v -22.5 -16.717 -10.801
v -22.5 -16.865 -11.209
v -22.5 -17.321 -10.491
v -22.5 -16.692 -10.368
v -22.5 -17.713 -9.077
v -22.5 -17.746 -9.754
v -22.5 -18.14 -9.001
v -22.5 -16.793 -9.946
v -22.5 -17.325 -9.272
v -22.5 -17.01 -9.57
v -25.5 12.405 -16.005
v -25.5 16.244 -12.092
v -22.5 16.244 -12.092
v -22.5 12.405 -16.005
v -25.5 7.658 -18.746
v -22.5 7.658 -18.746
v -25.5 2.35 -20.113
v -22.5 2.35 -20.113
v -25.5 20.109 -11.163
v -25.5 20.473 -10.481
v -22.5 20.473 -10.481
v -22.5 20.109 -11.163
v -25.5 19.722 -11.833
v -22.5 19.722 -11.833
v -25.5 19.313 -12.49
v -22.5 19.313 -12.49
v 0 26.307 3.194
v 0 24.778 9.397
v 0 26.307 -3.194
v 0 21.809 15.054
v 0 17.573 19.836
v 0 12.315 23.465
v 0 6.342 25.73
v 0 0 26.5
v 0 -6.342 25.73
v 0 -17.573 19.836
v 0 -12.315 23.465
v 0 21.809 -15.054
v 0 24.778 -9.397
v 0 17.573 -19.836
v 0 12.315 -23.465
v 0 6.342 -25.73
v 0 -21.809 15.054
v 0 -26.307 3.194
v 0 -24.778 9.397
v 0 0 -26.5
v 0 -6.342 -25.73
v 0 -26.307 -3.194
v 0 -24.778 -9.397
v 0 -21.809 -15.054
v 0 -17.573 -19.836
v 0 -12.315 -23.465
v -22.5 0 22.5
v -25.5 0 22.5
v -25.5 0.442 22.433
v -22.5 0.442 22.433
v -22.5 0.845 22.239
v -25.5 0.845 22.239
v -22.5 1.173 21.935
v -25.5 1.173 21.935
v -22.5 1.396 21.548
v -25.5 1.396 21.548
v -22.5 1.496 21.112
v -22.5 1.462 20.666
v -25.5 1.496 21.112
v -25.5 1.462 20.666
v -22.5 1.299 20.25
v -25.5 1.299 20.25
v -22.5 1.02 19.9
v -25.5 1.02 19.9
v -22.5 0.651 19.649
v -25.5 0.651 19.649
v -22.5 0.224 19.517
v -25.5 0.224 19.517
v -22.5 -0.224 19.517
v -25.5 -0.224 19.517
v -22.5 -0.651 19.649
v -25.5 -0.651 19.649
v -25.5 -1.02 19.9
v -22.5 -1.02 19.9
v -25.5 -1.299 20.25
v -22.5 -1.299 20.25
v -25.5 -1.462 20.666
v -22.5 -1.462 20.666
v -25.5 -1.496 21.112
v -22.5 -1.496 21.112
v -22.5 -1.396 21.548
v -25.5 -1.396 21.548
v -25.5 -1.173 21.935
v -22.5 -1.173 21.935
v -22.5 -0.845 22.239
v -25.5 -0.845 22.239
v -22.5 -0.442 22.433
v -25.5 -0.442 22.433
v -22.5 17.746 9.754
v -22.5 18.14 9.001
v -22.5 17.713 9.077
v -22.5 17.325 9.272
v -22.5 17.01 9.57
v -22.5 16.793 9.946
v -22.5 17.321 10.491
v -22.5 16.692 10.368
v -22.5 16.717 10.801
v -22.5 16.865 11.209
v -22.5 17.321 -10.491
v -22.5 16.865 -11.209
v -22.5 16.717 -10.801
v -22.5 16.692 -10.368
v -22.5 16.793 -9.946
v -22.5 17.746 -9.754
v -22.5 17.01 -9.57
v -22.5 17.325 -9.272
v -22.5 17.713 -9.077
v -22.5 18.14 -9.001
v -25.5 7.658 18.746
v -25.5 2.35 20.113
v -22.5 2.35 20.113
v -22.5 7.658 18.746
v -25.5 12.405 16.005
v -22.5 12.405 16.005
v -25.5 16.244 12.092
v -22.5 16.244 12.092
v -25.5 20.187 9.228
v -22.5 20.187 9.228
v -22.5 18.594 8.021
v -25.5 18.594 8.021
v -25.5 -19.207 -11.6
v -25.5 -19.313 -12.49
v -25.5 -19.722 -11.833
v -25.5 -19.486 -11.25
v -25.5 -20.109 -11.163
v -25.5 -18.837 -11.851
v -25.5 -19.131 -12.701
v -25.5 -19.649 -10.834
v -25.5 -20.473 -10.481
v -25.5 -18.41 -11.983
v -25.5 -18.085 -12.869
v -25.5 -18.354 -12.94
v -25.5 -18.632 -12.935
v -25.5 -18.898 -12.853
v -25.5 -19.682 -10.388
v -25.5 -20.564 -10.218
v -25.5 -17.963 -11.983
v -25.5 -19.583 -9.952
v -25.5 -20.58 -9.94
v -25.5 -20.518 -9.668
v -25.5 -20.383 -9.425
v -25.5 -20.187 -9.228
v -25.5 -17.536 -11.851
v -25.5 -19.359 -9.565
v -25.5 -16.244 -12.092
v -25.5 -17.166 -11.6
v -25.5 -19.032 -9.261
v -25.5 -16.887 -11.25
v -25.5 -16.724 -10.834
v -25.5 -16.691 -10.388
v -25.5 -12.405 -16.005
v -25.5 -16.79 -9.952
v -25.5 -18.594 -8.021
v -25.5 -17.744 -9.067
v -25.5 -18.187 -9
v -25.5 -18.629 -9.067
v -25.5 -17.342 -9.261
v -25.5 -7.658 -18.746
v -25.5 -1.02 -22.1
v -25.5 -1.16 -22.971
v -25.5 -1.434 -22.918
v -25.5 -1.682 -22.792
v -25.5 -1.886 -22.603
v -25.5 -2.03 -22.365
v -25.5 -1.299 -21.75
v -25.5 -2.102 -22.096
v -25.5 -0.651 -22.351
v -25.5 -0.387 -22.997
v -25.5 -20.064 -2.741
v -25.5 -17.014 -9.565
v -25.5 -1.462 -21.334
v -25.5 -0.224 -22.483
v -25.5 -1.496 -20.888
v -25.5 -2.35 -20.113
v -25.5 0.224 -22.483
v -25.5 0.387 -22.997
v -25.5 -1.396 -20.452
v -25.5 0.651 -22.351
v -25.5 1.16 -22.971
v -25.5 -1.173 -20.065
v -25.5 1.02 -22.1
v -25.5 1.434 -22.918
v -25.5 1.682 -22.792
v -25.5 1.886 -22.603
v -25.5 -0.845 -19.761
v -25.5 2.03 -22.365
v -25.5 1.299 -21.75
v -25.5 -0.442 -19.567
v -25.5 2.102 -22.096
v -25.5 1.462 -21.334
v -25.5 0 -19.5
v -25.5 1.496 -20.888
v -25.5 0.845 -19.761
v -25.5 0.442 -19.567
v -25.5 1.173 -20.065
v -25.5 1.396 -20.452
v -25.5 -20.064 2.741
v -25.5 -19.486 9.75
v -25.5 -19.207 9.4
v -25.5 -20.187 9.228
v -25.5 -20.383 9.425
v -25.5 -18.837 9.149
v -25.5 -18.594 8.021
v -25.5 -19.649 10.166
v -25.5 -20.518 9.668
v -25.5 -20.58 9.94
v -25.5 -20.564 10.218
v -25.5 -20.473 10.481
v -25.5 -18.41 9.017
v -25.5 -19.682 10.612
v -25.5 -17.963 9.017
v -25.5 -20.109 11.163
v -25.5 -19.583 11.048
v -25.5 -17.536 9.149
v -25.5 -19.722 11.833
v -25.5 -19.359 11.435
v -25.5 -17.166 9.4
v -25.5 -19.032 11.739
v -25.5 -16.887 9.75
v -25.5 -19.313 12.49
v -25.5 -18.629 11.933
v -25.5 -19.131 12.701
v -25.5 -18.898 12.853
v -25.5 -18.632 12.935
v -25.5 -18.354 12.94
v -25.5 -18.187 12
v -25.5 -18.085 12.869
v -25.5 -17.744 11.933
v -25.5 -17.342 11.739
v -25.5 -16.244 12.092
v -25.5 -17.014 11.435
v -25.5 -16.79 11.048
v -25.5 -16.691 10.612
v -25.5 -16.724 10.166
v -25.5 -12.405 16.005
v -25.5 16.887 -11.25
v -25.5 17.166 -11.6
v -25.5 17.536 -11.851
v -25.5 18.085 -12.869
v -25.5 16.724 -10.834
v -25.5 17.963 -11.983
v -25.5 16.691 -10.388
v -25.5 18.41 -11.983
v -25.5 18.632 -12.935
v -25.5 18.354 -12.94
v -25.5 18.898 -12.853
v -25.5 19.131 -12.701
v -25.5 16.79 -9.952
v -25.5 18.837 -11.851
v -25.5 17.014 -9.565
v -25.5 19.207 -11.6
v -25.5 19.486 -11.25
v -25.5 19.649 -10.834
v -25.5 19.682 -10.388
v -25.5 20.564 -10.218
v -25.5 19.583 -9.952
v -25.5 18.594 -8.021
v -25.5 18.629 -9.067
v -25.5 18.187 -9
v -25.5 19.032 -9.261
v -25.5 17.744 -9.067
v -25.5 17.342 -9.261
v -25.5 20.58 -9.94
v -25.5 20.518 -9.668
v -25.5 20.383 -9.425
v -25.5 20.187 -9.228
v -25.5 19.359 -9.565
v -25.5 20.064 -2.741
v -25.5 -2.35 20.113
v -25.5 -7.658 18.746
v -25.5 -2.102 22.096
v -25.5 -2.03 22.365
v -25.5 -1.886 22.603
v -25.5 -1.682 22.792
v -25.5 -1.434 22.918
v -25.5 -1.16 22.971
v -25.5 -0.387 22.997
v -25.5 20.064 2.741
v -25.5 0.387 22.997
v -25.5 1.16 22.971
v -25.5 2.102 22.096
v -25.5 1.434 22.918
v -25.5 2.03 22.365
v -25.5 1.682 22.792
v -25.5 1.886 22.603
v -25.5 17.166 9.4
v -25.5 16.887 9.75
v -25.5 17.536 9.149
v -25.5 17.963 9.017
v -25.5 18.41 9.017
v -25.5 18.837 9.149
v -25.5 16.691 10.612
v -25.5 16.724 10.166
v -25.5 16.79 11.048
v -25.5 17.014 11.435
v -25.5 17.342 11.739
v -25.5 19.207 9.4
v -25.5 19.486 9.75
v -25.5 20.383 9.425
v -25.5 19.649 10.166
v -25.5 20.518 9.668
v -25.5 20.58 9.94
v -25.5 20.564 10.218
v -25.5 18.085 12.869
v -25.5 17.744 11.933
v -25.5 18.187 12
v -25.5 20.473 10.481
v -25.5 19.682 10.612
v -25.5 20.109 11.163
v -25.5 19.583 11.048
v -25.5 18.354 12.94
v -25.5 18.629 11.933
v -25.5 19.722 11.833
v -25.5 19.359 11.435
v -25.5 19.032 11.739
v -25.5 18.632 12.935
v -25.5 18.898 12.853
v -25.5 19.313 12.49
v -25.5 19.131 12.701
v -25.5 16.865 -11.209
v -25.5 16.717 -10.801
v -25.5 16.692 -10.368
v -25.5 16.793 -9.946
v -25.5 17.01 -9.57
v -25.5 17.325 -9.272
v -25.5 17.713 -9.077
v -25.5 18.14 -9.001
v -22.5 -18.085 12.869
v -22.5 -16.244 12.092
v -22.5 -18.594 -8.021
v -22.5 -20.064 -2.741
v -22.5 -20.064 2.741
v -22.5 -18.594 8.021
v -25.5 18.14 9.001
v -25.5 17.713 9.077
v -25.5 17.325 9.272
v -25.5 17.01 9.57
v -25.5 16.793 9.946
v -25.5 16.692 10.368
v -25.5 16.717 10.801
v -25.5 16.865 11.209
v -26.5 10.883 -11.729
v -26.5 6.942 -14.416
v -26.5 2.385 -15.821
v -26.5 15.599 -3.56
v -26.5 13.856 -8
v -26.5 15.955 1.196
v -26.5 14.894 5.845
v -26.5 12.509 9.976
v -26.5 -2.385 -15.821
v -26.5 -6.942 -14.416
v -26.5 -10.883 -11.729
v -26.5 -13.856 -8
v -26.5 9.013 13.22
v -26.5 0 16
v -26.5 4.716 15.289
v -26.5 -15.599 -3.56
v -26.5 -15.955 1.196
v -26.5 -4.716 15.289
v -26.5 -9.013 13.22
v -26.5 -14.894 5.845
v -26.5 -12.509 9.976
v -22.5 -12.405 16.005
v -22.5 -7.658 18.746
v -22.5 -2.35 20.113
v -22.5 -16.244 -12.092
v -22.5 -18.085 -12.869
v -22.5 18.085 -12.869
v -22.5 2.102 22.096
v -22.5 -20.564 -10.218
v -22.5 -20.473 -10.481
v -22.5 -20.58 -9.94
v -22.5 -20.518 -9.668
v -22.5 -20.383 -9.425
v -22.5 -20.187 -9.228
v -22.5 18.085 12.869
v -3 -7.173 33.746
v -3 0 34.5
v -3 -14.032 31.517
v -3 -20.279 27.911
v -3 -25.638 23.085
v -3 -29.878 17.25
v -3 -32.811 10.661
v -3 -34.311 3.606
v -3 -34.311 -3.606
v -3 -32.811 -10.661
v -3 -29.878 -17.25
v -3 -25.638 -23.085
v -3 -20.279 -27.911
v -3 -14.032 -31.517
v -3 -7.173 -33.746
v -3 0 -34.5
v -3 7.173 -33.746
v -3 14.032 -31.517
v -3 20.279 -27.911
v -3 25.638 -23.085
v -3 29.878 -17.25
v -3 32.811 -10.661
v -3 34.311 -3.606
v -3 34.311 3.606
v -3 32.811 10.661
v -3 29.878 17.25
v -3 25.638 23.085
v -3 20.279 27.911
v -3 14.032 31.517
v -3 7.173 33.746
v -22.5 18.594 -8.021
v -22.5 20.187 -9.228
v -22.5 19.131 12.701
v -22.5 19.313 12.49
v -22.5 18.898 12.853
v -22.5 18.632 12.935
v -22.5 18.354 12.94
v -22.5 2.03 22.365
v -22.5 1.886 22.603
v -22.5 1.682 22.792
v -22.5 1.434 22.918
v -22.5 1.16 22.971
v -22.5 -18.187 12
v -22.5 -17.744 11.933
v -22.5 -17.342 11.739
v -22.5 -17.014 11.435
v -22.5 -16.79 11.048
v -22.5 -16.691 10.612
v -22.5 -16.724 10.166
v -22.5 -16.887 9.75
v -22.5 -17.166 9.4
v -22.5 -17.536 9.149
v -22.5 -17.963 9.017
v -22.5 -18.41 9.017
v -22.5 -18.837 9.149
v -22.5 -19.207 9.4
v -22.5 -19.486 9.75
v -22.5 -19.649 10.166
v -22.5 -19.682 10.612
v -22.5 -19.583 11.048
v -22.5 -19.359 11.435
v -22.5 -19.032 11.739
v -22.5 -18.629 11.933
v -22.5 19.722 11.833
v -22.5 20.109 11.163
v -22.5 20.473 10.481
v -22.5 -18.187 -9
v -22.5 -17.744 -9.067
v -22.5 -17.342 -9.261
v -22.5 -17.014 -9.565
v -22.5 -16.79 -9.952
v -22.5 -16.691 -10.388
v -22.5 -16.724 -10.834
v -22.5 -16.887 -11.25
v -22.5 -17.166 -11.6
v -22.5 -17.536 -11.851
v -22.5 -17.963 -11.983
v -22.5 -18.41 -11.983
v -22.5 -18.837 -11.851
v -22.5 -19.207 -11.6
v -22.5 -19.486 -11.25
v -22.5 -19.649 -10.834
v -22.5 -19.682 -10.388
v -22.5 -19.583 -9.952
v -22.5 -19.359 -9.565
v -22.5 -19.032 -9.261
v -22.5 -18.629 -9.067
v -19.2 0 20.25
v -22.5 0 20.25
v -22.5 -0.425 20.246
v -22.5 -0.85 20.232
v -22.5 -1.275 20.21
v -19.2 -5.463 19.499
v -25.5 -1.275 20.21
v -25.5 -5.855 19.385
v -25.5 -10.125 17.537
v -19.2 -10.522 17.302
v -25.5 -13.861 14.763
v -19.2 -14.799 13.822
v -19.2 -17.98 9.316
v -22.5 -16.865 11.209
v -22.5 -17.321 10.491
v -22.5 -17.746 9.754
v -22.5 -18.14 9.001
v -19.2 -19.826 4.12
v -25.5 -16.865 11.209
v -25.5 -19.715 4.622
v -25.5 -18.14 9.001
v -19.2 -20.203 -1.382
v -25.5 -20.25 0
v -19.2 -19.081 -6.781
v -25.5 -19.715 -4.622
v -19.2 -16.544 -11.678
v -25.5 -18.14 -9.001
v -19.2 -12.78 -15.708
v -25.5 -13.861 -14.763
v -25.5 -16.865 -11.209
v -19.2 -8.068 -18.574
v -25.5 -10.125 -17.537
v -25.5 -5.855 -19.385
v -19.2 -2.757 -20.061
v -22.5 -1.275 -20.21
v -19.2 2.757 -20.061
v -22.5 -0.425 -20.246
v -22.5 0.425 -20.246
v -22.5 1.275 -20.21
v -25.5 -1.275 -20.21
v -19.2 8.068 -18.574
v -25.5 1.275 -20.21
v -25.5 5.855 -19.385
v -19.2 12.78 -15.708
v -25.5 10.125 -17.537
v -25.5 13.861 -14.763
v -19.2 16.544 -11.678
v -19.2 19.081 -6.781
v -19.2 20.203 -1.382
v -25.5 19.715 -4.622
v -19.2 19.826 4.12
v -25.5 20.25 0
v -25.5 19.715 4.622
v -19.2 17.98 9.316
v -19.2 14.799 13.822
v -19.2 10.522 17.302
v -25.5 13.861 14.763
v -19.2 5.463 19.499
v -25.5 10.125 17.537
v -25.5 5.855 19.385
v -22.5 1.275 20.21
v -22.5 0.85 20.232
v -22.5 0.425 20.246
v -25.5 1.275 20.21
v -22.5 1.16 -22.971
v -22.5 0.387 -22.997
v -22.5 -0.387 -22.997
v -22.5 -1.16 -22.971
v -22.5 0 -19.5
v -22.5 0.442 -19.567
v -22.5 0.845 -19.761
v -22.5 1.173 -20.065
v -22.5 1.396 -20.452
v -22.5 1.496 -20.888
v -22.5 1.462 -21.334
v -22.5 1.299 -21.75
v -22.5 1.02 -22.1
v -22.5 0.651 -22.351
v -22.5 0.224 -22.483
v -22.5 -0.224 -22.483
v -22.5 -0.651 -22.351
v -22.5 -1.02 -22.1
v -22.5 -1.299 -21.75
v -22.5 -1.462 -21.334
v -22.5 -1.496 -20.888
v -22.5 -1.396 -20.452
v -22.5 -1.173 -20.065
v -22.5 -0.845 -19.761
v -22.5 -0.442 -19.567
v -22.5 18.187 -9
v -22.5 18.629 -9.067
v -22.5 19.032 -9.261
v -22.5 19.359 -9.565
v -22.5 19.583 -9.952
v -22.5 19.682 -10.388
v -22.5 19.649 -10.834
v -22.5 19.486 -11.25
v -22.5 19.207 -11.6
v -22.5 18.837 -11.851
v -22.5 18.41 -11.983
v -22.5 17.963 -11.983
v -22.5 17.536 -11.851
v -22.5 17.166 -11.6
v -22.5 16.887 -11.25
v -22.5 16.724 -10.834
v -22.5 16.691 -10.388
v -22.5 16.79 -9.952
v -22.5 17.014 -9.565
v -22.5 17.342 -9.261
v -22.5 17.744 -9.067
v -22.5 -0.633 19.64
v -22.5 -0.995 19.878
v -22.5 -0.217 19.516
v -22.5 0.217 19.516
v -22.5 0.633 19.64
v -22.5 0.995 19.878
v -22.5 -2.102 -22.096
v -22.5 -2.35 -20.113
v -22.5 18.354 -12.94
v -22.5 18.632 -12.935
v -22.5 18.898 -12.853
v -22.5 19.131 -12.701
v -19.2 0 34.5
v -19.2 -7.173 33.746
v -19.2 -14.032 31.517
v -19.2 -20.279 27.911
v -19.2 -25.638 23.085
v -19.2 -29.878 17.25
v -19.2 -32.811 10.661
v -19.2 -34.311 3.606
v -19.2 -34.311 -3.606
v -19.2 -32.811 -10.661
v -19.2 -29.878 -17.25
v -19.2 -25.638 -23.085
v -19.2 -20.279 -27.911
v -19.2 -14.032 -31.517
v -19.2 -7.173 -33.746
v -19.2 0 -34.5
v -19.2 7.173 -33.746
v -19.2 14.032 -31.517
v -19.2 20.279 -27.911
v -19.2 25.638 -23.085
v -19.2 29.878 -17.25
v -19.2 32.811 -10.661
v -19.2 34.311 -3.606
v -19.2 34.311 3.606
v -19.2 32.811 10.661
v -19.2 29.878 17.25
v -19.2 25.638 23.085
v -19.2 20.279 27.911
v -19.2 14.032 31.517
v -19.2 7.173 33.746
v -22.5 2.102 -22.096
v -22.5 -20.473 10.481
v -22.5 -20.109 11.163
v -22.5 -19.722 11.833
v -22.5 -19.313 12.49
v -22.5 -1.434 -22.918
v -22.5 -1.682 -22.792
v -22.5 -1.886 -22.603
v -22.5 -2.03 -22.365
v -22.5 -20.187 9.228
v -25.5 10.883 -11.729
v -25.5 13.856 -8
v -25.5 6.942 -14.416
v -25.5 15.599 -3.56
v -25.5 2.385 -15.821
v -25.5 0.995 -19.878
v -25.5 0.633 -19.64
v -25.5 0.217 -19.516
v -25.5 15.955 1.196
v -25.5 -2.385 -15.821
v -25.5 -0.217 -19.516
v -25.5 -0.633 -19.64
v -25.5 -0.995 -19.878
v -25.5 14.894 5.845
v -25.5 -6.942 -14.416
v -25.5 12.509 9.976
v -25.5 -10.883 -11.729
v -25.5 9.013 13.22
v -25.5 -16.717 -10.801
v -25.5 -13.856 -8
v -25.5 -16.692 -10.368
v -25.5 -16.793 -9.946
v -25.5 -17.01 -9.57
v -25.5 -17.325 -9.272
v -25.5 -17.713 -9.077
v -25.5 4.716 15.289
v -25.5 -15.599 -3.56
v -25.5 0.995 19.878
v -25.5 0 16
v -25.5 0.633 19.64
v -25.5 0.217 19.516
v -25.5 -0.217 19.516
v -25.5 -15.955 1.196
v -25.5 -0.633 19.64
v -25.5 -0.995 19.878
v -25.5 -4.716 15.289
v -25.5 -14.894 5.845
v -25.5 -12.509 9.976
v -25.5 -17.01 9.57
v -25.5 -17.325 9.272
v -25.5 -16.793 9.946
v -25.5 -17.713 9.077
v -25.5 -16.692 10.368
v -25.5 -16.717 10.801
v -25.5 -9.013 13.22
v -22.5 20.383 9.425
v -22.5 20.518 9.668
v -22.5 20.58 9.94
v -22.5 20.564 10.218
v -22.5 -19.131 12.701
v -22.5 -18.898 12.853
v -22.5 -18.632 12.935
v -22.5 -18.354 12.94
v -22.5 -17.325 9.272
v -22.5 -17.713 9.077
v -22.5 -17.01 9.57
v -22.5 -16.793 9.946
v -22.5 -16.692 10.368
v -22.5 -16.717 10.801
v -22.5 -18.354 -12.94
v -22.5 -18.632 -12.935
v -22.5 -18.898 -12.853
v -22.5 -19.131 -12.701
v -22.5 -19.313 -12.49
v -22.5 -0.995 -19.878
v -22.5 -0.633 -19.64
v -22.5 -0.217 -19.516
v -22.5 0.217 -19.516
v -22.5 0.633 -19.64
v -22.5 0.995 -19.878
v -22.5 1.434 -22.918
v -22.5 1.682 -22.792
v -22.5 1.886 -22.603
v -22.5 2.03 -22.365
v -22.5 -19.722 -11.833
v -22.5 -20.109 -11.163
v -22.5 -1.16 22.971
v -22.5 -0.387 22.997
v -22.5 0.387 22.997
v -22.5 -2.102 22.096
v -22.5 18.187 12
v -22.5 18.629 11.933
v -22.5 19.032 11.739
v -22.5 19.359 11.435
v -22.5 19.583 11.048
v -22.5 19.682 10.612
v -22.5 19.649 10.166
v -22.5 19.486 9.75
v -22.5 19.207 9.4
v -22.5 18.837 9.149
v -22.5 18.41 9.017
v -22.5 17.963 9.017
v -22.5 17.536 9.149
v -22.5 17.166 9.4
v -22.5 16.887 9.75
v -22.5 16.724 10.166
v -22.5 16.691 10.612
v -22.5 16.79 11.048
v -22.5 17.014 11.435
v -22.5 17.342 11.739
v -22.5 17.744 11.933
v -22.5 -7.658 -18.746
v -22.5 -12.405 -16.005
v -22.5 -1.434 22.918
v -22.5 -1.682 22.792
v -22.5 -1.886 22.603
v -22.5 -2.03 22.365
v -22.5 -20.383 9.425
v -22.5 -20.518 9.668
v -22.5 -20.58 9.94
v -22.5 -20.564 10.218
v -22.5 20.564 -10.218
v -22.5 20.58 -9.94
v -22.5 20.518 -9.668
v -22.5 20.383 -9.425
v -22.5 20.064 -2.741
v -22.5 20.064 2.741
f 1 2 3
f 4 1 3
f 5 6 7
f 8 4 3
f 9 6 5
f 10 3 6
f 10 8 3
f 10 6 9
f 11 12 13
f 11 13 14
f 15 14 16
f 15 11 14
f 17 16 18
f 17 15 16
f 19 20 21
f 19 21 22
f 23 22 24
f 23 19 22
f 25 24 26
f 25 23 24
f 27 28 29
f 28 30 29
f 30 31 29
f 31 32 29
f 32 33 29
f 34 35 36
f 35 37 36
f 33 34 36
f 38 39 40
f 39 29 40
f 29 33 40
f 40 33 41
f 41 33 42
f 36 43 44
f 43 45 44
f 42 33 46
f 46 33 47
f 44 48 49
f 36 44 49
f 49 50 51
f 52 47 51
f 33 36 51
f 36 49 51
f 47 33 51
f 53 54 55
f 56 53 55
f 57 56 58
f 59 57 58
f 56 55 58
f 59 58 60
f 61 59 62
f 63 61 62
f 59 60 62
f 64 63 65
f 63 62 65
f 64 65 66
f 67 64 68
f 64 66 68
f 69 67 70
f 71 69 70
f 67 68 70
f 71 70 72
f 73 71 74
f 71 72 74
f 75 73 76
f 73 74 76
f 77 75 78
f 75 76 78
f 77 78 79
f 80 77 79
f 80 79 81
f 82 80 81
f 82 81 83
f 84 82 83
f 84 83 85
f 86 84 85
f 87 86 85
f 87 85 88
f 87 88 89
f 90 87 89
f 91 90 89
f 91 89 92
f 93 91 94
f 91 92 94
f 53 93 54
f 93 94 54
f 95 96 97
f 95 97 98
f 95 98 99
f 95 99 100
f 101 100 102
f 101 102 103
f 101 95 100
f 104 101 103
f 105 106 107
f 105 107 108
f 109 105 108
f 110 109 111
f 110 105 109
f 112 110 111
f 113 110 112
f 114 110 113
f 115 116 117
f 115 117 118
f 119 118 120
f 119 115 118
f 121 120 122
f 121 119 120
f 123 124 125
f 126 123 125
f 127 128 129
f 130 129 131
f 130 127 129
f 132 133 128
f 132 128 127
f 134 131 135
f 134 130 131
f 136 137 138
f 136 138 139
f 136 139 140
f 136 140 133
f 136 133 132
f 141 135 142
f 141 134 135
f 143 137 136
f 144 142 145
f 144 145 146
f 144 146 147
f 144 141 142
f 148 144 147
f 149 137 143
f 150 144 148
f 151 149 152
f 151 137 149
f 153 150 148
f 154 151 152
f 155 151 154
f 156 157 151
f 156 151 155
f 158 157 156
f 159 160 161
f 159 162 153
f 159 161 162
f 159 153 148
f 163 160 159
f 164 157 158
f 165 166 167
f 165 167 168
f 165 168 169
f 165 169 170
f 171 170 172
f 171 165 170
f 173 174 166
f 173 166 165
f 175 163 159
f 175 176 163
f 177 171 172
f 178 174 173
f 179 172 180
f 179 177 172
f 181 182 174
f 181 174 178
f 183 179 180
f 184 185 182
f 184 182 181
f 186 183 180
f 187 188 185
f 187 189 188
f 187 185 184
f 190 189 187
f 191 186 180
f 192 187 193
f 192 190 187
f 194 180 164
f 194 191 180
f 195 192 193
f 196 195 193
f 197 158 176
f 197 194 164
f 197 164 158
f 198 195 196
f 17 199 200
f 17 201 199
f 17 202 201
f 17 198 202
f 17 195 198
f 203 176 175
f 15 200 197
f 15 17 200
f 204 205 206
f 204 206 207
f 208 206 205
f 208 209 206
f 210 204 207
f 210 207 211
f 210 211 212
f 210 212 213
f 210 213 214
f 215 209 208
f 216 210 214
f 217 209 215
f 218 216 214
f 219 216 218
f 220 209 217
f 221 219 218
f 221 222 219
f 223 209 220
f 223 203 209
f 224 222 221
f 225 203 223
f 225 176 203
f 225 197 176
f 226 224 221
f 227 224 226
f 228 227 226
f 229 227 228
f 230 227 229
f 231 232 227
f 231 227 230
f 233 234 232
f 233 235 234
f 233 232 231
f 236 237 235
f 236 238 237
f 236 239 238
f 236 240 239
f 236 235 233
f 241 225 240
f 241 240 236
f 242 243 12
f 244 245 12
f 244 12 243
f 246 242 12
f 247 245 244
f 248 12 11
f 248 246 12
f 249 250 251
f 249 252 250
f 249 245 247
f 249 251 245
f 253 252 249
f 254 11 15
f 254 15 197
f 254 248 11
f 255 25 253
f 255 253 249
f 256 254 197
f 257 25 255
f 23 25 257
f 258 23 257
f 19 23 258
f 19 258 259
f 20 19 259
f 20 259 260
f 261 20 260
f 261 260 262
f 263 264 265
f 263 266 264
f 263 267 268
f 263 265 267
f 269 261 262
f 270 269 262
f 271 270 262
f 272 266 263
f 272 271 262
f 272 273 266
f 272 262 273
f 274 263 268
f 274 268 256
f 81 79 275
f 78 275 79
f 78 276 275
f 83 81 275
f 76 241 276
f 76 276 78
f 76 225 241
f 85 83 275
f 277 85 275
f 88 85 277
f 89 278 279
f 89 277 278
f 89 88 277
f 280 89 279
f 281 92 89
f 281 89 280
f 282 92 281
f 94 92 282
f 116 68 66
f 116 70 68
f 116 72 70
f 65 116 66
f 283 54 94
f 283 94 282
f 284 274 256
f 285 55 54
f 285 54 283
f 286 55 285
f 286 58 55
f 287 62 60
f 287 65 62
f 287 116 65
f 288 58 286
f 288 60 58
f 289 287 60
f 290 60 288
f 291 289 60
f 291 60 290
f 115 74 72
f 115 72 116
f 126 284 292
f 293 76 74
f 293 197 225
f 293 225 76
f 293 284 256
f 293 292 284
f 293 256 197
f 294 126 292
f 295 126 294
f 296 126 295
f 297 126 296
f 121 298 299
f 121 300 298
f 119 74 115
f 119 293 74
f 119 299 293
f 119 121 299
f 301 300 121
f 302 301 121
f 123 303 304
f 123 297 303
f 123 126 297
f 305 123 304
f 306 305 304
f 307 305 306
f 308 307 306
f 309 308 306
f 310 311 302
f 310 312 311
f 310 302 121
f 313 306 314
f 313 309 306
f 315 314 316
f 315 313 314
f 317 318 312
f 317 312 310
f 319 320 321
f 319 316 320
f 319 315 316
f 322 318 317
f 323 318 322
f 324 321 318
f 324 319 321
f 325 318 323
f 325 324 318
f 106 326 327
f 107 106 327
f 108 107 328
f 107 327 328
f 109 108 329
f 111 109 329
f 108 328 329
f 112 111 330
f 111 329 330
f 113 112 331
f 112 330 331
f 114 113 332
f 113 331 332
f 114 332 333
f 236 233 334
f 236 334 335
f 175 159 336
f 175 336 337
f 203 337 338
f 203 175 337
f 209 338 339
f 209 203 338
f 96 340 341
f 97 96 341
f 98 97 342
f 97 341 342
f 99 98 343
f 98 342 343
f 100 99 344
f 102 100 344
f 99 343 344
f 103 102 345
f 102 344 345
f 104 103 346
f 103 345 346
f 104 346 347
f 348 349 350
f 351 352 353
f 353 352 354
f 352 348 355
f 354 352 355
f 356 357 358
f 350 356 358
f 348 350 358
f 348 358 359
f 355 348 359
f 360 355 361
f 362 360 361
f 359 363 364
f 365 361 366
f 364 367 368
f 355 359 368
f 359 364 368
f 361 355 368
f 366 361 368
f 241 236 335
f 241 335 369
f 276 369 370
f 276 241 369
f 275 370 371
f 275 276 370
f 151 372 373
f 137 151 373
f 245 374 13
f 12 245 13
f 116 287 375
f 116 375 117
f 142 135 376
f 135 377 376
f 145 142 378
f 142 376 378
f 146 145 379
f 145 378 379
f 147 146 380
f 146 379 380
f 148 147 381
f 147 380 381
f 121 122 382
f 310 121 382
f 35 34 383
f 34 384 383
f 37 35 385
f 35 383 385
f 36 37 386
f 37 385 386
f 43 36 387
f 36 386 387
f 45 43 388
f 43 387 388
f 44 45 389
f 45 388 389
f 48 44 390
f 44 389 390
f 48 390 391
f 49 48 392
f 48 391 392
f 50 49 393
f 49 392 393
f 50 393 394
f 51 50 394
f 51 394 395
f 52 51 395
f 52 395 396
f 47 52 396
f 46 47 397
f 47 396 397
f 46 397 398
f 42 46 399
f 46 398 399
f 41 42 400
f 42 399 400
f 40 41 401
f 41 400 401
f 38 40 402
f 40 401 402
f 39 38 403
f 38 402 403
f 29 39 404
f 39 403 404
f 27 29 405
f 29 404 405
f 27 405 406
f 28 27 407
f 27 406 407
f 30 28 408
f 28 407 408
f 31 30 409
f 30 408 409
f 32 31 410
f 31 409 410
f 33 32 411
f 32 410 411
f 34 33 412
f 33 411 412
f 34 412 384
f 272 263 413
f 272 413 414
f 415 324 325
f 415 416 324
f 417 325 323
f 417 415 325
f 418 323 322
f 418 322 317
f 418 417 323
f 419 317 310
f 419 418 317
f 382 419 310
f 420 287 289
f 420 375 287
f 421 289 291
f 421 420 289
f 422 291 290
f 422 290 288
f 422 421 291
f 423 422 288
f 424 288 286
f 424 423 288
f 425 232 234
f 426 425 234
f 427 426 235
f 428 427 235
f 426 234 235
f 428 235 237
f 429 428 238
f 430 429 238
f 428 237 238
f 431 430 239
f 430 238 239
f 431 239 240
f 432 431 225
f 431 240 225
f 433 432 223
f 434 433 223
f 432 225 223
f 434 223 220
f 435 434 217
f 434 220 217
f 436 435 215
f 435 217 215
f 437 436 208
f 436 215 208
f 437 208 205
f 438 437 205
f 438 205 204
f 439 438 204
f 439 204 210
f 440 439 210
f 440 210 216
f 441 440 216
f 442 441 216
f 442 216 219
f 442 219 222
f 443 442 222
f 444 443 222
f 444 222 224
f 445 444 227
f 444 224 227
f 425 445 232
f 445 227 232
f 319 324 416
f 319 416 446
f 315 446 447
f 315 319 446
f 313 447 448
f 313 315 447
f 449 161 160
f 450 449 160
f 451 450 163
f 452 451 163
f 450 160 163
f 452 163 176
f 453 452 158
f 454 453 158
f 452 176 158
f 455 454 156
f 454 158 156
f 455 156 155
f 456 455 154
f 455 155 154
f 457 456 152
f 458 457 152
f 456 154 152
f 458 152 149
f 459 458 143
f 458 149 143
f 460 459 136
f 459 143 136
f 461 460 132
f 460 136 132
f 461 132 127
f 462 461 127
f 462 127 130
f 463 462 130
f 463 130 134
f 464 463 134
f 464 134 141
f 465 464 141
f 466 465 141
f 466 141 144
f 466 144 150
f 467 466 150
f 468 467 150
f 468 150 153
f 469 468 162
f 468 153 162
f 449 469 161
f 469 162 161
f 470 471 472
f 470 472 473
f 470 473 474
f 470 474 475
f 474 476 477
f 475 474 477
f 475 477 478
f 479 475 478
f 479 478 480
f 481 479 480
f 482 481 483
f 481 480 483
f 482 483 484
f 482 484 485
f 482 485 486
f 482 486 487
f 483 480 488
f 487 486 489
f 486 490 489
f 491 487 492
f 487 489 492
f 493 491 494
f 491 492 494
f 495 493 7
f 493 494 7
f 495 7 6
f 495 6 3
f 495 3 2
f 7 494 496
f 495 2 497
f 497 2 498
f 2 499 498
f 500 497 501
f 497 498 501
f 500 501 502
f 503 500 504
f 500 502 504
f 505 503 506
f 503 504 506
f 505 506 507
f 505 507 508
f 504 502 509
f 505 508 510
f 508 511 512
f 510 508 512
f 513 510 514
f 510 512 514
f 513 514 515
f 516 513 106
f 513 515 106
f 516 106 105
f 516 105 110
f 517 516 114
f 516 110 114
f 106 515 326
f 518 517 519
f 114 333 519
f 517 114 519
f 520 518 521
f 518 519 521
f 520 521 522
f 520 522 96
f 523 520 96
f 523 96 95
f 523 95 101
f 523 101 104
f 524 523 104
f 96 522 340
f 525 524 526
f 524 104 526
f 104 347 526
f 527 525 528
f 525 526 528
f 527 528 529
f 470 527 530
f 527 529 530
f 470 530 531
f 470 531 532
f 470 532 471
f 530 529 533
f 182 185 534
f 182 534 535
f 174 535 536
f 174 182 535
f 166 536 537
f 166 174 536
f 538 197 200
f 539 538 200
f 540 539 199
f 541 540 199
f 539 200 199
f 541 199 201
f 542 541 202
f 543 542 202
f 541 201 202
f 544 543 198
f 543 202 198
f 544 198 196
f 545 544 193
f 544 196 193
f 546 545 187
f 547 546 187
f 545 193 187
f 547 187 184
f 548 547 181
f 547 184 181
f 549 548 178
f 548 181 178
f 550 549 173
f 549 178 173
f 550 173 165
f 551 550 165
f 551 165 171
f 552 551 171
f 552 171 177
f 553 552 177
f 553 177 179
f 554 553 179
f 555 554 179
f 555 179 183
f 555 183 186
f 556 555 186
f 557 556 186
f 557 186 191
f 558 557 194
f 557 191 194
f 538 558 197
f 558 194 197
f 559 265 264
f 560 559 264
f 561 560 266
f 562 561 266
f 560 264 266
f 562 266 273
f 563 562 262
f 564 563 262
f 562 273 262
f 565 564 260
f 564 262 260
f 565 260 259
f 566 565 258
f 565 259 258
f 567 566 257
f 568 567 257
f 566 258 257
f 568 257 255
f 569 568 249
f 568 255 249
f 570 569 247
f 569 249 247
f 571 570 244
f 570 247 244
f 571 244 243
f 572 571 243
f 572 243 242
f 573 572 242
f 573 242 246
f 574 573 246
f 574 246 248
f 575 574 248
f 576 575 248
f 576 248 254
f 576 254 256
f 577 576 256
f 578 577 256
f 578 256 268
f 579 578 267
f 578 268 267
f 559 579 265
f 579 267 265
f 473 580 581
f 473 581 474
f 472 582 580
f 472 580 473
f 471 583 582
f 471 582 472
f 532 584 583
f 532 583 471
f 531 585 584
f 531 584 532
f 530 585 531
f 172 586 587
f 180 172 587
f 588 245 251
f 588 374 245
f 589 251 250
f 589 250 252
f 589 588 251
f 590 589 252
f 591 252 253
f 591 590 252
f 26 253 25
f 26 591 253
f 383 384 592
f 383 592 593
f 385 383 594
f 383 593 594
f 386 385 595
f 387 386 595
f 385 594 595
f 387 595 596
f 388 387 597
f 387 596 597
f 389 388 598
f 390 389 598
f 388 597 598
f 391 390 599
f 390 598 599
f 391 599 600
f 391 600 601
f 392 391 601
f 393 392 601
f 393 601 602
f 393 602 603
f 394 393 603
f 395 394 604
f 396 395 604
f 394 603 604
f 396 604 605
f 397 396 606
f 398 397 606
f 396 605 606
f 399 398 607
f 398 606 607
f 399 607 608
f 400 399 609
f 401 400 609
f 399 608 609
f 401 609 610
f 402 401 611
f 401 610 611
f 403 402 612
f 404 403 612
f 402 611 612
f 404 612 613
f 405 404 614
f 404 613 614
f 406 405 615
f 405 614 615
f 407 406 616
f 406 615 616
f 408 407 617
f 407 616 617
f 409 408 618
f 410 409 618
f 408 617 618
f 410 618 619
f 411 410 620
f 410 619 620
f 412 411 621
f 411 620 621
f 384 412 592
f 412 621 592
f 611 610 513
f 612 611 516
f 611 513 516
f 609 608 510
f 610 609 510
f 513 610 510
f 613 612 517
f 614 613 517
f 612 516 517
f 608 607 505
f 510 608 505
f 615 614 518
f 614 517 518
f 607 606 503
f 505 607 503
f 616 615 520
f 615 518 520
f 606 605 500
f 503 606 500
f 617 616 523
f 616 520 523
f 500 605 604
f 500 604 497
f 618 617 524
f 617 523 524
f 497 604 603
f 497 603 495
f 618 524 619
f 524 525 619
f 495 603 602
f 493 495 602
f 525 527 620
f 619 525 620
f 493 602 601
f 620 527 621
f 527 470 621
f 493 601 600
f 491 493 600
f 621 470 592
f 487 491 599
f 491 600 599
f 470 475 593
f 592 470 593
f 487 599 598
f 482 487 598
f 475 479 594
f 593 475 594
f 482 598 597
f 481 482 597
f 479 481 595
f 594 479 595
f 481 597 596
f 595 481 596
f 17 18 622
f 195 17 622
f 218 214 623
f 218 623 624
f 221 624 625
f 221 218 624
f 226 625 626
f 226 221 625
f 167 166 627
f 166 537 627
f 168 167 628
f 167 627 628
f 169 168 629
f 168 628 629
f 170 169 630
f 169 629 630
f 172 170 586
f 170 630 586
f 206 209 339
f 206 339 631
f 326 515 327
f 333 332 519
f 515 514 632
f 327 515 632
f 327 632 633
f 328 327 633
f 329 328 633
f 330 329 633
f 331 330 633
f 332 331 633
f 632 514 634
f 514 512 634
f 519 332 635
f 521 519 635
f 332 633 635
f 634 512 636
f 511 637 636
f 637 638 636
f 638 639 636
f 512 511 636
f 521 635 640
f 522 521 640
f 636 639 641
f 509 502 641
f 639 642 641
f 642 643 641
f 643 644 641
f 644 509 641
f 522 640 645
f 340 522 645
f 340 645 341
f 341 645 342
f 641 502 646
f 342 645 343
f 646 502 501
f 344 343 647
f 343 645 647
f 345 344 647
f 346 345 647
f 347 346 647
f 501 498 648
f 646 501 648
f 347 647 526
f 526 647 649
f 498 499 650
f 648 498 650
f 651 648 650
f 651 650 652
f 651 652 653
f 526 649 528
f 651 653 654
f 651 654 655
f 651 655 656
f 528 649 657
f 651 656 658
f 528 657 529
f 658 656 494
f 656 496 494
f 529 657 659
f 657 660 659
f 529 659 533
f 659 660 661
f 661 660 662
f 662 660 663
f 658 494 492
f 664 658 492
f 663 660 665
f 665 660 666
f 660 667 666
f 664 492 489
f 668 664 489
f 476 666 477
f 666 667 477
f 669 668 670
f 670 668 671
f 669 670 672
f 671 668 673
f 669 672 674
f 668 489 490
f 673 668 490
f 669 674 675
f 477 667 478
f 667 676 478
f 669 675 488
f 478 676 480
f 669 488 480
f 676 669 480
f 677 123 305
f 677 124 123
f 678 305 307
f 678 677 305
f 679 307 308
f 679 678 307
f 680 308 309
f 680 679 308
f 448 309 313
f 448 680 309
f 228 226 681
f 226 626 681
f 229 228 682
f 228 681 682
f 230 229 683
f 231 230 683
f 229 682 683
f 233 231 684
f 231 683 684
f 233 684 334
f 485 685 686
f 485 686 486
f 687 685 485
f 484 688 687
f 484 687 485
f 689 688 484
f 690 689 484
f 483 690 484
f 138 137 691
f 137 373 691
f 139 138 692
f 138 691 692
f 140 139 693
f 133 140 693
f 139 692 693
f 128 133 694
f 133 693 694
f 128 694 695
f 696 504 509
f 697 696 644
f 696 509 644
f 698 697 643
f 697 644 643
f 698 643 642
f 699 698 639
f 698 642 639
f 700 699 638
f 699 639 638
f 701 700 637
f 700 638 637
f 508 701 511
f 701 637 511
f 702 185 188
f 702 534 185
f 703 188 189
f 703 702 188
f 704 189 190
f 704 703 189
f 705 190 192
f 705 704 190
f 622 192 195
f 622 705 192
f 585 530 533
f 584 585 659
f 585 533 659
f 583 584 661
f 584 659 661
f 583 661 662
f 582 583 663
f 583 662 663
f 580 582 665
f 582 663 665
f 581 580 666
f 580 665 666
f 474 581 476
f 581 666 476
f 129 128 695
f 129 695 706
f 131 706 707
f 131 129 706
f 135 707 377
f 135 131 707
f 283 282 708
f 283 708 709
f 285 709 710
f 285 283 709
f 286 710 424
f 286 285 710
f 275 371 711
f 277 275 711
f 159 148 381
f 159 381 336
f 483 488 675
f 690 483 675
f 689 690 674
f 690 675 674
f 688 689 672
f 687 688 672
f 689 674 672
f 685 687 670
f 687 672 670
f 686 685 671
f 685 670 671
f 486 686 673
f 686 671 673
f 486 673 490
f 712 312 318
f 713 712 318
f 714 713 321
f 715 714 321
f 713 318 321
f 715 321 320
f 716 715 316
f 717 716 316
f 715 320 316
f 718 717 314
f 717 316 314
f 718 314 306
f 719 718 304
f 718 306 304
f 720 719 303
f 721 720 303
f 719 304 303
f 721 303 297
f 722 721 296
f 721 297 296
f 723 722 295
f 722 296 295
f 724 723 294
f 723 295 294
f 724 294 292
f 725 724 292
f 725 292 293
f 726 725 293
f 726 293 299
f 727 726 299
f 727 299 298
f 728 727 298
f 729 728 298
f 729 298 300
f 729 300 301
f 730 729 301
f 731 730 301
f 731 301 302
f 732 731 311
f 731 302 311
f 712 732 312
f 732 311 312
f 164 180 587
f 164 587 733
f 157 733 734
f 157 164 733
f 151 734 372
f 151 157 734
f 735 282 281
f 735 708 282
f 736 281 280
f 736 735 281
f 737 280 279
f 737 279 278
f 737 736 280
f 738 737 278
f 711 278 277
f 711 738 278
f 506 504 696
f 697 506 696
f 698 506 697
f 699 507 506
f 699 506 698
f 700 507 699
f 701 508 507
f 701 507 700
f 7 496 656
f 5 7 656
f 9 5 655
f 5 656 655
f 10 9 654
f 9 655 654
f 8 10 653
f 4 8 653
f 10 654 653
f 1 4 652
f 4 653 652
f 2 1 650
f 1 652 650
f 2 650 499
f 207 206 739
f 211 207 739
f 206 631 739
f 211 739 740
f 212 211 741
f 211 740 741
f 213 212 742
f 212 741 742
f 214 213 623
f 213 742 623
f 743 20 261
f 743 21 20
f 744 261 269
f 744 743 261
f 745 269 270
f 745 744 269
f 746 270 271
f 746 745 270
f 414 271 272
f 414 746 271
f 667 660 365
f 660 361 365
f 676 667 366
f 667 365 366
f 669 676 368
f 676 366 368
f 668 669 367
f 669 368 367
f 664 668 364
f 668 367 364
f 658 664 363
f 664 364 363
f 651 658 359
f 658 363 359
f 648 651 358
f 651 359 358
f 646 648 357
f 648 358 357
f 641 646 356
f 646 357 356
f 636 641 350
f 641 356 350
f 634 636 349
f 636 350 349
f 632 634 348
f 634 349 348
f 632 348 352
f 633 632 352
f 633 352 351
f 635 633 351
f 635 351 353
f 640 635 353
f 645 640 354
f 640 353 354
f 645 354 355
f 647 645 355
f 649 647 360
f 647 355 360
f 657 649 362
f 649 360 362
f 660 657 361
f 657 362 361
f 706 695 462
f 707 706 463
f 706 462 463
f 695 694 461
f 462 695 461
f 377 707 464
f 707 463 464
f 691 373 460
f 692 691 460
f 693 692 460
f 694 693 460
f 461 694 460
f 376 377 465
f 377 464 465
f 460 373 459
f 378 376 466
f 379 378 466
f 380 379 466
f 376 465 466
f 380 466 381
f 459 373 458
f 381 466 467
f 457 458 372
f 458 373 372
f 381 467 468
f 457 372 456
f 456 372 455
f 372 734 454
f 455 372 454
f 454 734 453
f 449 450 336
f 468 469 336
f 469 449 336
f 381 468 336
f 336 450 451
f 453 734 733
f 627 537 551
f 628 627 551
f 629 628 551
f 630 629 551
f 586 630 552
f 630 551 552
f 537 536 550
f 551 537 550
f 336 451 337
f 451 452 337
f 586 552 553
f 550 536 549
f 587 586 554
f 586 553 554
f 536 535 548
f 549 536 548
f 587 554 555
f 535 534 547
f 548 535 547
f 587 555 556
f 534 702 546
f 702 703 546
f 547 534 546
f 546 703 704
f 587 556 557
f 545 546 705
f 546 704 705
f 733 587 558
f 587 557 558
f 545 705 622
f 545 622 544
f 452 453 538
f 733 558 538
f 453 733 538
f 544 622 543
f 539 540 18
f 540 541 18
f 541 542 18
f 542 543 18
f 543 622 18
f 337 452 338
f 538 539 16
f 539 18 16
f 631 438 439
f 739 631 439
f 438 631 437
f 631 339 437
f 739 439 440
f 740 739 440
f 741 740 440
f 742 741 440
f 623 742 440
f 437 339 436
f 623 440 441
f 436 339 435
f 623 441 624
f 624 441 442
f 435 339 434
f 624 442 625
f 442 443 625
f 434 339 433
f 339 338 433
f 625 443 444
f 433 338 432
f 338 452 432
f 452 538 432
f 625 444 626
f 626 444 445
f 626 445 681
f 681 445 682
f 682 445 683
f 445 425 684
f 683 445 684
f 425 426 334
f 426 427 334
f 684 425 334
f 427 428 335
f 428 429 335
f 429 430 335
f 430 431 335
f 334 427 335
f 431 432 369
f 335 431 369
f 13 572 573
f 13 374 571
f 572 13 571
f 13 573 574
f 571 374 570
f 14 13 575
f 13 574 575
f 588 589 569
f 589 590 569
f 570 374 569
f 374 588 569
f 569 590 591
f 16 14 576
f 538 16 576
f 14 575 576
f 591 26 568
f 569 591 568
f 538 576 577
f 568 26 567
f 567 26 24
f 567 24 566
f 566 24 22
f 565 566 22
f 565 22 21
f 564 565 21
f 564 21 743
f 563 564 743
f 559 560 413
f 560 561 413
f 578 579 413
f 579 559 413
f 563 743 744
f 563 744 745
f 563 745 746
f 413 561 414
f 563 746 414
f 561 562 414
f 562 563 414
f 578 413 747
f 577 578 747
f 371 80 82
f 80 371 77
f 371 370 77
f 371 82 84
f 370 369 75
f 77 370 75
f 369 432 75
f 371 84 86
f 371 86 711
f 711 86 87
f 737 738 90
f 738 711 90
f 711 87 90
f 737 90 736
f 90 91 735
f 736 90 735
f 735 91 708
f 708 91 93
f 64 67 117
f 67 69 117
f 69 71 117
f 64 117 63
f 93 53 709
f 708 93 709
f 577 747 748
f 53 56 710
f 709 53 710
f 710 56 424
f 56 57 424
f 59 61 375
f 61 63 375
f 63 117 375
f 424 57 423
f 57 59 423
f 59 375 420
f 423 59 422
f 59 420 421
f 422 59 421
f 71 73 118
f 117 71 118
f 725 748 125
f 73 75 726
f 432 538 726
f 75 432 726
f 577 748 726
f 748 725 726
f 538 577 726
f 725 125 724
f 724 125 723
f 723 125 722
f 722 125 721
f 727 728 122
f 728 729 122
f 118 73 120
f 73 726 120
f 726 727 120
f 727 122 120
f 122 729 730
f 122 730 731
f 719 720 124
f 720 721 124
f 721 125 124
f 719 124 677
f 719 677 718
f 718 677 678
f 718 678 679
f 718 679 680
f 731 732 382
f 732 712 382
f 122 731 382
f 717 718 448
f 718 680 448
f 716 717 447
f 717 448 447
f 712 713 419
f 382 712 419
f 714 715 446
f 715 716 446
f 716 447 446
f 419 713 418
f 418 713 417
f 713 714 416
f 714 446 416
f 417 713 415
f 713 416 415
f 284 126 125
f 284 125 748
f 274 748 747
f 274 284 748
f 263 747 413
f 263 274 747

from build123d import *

# Parameters (mm, degrees)
SKETCH2_R           = 1.5
SKETCH2_R_2         = 20.25
SKETCH2_R_3         = 16
BOSS_EXTRUDE2_DEPTH = 3
SKETCH2_3_R         = 1.5
CUT_EXTRUDE1_DEPTH  = 3
FILLET1_R           = 1


with BuildPart() as part:
    # Sketch1 → Revolve1 (revolve)
    with BuildSketch(Plane.XY, mode=Mode.PRIVATE) as revolve1_sk:
        Polygon((0, 0), (0, 26.5), (-3, 34.5), (-19.2, 34.5), (-19.2, 20.25), (-25.5, 20.25), (-25.5, 16), (-26.5, 16), (-26.5, 0), align=None)
    revolve(revolve1_sk.sketch.rotate(Axis((-26.134704071, 0, 0), (1, 0, 0)), 90), axis=Axis((-26.134704071, 0, 0), (1, 0, 0)))


with BuildPart() as body_2:
    # Sketch2 → Boss-Extrude2 (new body)
    # profile 1 of 26: a face of its own
    with BuildSketch(Plane.ZY.offset(25.5)):
        with Locations((10.5, -18.186533479)):
            Circle(SKETCH2_R)
    # profile 2 of 26: a face of its own
    with BuildSketch(Plane.ZY.offset(25.5)):
        Circle(SKETCH2_R_2)
    # profile 3 of 26: a face of its own
    with BuildSketch(Plane.ZY.offset(25.5)):
        with Locations((10.5, -18.186533479)):
            Circle(SKETCH2_R)
    # profile 4 of 26: a face of its own
    with BuildSketch(Plane.ZY.offset(25.5)):
        Circle(SKETCH2_R_2)
    # profile 5 of 26: a face of its own
    with BuildSketch(Plane.ZY.offset(25.5)):
        with Locations((-10.5, -18.186533479)):
            Circle(SKETCH2_R)
    # profile 6 of 26: a face of its own
    with BuildSketch(Plane.ZY.offset(25.5)):
        Circle(SKETCH2_R_2)
    # profile 7 of 26: a face of its own
    with BuildSketch(Plane.ZY.offset(25.5)):
        with Locations((21, 0)):
            Circle(SKETCH2_R)
    # profile 8 of 26: a face of its own
    with BuildSketch(Plane.ZY.offset(25.5)):
        Circle(SKETCH2_R_2)
    # profile 9 of 26: a face of its own
    with BuildSketch(Plane.ZY.offset(25.5)):
        with Locations((21, 0)):
            Circle(SKETCH2_R)
    # profile 10 of 26: a face of its own
    with BuildSketch(Plane.ZY.offset(25.5)):
        Circle(SKETCH2_R_2)
    # profile 11 of 26: a face of its own
    with BuildSketch(Plane.ZY.offset(25.5)):
        with Locations((10.5, 18.186533479)):
            Circle(SKETCH2_R)
    # profile 12 of 26: a face of its own
    with BuildSketch(Plane.ZY.offset(25.5)):
        Circle(SKETCH2_R_2)
    # profile 13 of 26: a face of its own
    with BuildSketch(Plane.ZY.offset(25.5)):
        with Locations((10.5, 18.186533479)):
            Circle(SKETCH2_R)
    # profile 14 of 26: a face of its own
    with BuildSketch(Plane.ZY.offset(25.5)):
        Circle(SKETCH2_R_2)
    # profile 15 of 26: a face of its own
    with BuildSketch(Plane.ZY.offset(25.5)):
        with Locations((-10.5, 18.186533479)):
            Circle(SKETCH2_R)
    # profile 16 of 26: a face of its own
    with BuildSketch(Plane.ZY.offset(25.5)):
        Circle(SKETCH2_R_2)
    # profile 17 of 26: a face of its own
    with BuildSketch(Plane.ZY.offset(25.5)):
        with Locations((-10.5, 18.186533479)):
            Circle(SKETCH2_R)
    # profile 18 of 26: a face of its own
    with BuildSketch(Plane.ZY.offset(25.5)):
        Circle(SKETCH2_R_2)
    # profile 19 of 26: a face of its own
    with BuildSketch(Plane.ZY.offset(25.5)):
        with Locations((-21, 0)):
            Circle(SKETCH2_R)
    # profile 20 of 26: a face of its own
    with BuildSketch(Plane.ZY.offset(25.5)):
        with Locations((-10.5, -18.186533479)):
            Circle(SKETCH2_R)
    # profile 21 of 26: a face of its own
    with BuildSketch(Plane.ZY.offset(25.5)):
        with Locations((10.5, -18.186533479)):
            Circle(SKETCH2_R)
    # profile 22 of 26: a face of its own
    with BuildSketch(Plane.ZY.offset(25.5)):
        with Locations((21, 0)):
            Circle(SKETCH2_R)
    # profile 23 of 26: a face of its own
    with BuildSketch(Plane.ZY.offset(25.5)):
        with Locations((10.5, 18.186533479)):
            Circle(SKETCH2_R)
    # profile 24 of 26: a face of its own
    with BuildSketch(Plane.ZY.offset(25.5)):
        with Locations((-10.5, 18.186533479)):
            Circle(SKETCH2_R)
    # profile 25 of 26: a face of its own
    with BuildSketch(Plane.ZY.offset(25.5)):
        Circle(SKETCH2_R_2)
        Circle(SKETCH2_R_3, mode=Mode.SUBTRACT)
    # profile 26 of 26: a face of its own
    with BuildSketch(Plane.ZY.offset(25.5)):
        with BuildLine():
            ThreePointArc((-22.912878475, 2), (-23, 0), (-22.912878475, -2))
            Line((-22.912878475, -2), (-20.113179759, -2.35))
            ThreePointArc((-20.113179759, -2.35), (-17.537014427, -10.125), (-12.091749578, -16.243524622))
            Line((-12.091749578, -16.243524622), (-13.188490045, -18.843134833))
            ThreePointArc((-13.188490045, -18.843134833), (-11.5, -19.918584287), (-9.72438843, -20.843134833))
            Line((-9.72438843, -20.843134833), (-8.02143018, -18.593524622))
            ThreePointArc((-8.02143018, -18.593524622), (0, -20.25), (8.02143018, -18.593524622))
            Line((8.02143018, -18.593524622), (9.72438843, -20.843134833))
            ThreePointArc((9.72438843, -20.843134833), (11.5, -19.918584287), (13.188490045, -18.843134833))
            Line((13.188490045, -18.843134833), (12.091749578, -16.243524622))
            ThreePointArc((12.091749578, -16.243524622), (17.537014427, -10.125), (20.113179759, -2.35))
            Line((20.113179759, -2.35), (22.912878475, -2))
            ThreePointArc((22.912878475, -2), (23, 0), (22.912878475, 2))
            Line((22.912878475, 2), (20.113179759, 2.35))
            ThreePointArc((20.113179759, 2.35), (17.537014427, 10.125), (12.091749578, 16.243524622))
            Line((12.091749578, 16.243524622), (13.188490045, 18.843134833))
            ThreePointArc((13.188490045, 18.843134833), (11.5, 19.918584287), (9.72438843, 20.843134833))
            Line((9.72438843, 20.843134833), (8.02143018, 18.593524622))
            ThreePointArc((8.02143018, 18.593524622), (0, 20.25), (-8.02143018, 18.593524622))
            Line((-8.02143018, 18.593524622), (-9.72438843, 20.843134833))
            ThreePointArc((-9.72438843, 20.843134833), (-11.5, 19.918584287), (-13.188490045, 18.843134833))
            Line((-13.188490045, 18.843134833), (-12.091749578, 16.243524622))
            ThreePointArc((-12.091749578, 16.243524622), (-17.537014427, 10.125), (-20.113179759, 2.35))
            Line((-20.113179759, 2.35), (-22.912878475, 2))
        make_face()
    extrude(amount=-BOSS_EXTRUDE2_DEPTH)


with BuildPart() as cut_extrude1_tool:
    # Sketch2<3> → Cut-Extrude1 (new body)
    with BuildSketch(Plane.ZY.offset(25.5)):
        with Locations((-10.5, 18.186533479)):
            Circle(SKETCH2_3_R)
        with Locations((10.5, 18.186533479)):
            Circle(SKETCH2_3_R)
        with Locations((21, 0)):
            Circle(SKETCH2_3_R)
        with Locations((10.5, -18.186533479)):
            Circle(SKETCH2_3_R)
        with Locations((-10.5, -18.186533479)):
            Circle(SKETCH2_3_R)
        with Locations((-21, 0)):
            Circle(SKETCH2_3_R)
    extrude(amount=-CUT_EXTRUDE1_DEPTH)


with BuildPart() as part_1:
    add(part.part)

    # Cut-Extrude1: cut by cut_extrude1_tool
    add(cut_extrude1_tool.part, mode=Mode.SUBTRACT)


with BuildPart() as body_2_1:
    add(body_2.part)

    # Cut-Extrude1: cut by cut_extrude1_tool
    add(cut_extrude1_tool.part, mode=Mode.SUBTRACT)

    # Fillet1
    fillet1_edges = [body_2_1.edges().sort_by_distance(p)[0] for p in [
        (-24, 18.843134833, -13.188490045),
        (-24, 20.843134833, -9.72438843),
        (-24, 20.843134833, 9.72438843),
        (-24, 18.843134833, 13.188490045),
        (-24, 2, 22.912878475),
        (-24, -2, 22.912878475),
        (-24, -18.843134833, 13.188490045),
        (-24, -20.843134833, 9.72438843),
        (-24, -20.843134833, -9.72438843),
        (-24, -18.843134833, -13.188490045),
        (-24, -2, -22.912878475),
        (-24, 2, -22.912878475),
    ]]
    fillet(fillet1_edges, radius=FILLET1_R)


solid = Compound([part_1.part, body_2_1.part])
